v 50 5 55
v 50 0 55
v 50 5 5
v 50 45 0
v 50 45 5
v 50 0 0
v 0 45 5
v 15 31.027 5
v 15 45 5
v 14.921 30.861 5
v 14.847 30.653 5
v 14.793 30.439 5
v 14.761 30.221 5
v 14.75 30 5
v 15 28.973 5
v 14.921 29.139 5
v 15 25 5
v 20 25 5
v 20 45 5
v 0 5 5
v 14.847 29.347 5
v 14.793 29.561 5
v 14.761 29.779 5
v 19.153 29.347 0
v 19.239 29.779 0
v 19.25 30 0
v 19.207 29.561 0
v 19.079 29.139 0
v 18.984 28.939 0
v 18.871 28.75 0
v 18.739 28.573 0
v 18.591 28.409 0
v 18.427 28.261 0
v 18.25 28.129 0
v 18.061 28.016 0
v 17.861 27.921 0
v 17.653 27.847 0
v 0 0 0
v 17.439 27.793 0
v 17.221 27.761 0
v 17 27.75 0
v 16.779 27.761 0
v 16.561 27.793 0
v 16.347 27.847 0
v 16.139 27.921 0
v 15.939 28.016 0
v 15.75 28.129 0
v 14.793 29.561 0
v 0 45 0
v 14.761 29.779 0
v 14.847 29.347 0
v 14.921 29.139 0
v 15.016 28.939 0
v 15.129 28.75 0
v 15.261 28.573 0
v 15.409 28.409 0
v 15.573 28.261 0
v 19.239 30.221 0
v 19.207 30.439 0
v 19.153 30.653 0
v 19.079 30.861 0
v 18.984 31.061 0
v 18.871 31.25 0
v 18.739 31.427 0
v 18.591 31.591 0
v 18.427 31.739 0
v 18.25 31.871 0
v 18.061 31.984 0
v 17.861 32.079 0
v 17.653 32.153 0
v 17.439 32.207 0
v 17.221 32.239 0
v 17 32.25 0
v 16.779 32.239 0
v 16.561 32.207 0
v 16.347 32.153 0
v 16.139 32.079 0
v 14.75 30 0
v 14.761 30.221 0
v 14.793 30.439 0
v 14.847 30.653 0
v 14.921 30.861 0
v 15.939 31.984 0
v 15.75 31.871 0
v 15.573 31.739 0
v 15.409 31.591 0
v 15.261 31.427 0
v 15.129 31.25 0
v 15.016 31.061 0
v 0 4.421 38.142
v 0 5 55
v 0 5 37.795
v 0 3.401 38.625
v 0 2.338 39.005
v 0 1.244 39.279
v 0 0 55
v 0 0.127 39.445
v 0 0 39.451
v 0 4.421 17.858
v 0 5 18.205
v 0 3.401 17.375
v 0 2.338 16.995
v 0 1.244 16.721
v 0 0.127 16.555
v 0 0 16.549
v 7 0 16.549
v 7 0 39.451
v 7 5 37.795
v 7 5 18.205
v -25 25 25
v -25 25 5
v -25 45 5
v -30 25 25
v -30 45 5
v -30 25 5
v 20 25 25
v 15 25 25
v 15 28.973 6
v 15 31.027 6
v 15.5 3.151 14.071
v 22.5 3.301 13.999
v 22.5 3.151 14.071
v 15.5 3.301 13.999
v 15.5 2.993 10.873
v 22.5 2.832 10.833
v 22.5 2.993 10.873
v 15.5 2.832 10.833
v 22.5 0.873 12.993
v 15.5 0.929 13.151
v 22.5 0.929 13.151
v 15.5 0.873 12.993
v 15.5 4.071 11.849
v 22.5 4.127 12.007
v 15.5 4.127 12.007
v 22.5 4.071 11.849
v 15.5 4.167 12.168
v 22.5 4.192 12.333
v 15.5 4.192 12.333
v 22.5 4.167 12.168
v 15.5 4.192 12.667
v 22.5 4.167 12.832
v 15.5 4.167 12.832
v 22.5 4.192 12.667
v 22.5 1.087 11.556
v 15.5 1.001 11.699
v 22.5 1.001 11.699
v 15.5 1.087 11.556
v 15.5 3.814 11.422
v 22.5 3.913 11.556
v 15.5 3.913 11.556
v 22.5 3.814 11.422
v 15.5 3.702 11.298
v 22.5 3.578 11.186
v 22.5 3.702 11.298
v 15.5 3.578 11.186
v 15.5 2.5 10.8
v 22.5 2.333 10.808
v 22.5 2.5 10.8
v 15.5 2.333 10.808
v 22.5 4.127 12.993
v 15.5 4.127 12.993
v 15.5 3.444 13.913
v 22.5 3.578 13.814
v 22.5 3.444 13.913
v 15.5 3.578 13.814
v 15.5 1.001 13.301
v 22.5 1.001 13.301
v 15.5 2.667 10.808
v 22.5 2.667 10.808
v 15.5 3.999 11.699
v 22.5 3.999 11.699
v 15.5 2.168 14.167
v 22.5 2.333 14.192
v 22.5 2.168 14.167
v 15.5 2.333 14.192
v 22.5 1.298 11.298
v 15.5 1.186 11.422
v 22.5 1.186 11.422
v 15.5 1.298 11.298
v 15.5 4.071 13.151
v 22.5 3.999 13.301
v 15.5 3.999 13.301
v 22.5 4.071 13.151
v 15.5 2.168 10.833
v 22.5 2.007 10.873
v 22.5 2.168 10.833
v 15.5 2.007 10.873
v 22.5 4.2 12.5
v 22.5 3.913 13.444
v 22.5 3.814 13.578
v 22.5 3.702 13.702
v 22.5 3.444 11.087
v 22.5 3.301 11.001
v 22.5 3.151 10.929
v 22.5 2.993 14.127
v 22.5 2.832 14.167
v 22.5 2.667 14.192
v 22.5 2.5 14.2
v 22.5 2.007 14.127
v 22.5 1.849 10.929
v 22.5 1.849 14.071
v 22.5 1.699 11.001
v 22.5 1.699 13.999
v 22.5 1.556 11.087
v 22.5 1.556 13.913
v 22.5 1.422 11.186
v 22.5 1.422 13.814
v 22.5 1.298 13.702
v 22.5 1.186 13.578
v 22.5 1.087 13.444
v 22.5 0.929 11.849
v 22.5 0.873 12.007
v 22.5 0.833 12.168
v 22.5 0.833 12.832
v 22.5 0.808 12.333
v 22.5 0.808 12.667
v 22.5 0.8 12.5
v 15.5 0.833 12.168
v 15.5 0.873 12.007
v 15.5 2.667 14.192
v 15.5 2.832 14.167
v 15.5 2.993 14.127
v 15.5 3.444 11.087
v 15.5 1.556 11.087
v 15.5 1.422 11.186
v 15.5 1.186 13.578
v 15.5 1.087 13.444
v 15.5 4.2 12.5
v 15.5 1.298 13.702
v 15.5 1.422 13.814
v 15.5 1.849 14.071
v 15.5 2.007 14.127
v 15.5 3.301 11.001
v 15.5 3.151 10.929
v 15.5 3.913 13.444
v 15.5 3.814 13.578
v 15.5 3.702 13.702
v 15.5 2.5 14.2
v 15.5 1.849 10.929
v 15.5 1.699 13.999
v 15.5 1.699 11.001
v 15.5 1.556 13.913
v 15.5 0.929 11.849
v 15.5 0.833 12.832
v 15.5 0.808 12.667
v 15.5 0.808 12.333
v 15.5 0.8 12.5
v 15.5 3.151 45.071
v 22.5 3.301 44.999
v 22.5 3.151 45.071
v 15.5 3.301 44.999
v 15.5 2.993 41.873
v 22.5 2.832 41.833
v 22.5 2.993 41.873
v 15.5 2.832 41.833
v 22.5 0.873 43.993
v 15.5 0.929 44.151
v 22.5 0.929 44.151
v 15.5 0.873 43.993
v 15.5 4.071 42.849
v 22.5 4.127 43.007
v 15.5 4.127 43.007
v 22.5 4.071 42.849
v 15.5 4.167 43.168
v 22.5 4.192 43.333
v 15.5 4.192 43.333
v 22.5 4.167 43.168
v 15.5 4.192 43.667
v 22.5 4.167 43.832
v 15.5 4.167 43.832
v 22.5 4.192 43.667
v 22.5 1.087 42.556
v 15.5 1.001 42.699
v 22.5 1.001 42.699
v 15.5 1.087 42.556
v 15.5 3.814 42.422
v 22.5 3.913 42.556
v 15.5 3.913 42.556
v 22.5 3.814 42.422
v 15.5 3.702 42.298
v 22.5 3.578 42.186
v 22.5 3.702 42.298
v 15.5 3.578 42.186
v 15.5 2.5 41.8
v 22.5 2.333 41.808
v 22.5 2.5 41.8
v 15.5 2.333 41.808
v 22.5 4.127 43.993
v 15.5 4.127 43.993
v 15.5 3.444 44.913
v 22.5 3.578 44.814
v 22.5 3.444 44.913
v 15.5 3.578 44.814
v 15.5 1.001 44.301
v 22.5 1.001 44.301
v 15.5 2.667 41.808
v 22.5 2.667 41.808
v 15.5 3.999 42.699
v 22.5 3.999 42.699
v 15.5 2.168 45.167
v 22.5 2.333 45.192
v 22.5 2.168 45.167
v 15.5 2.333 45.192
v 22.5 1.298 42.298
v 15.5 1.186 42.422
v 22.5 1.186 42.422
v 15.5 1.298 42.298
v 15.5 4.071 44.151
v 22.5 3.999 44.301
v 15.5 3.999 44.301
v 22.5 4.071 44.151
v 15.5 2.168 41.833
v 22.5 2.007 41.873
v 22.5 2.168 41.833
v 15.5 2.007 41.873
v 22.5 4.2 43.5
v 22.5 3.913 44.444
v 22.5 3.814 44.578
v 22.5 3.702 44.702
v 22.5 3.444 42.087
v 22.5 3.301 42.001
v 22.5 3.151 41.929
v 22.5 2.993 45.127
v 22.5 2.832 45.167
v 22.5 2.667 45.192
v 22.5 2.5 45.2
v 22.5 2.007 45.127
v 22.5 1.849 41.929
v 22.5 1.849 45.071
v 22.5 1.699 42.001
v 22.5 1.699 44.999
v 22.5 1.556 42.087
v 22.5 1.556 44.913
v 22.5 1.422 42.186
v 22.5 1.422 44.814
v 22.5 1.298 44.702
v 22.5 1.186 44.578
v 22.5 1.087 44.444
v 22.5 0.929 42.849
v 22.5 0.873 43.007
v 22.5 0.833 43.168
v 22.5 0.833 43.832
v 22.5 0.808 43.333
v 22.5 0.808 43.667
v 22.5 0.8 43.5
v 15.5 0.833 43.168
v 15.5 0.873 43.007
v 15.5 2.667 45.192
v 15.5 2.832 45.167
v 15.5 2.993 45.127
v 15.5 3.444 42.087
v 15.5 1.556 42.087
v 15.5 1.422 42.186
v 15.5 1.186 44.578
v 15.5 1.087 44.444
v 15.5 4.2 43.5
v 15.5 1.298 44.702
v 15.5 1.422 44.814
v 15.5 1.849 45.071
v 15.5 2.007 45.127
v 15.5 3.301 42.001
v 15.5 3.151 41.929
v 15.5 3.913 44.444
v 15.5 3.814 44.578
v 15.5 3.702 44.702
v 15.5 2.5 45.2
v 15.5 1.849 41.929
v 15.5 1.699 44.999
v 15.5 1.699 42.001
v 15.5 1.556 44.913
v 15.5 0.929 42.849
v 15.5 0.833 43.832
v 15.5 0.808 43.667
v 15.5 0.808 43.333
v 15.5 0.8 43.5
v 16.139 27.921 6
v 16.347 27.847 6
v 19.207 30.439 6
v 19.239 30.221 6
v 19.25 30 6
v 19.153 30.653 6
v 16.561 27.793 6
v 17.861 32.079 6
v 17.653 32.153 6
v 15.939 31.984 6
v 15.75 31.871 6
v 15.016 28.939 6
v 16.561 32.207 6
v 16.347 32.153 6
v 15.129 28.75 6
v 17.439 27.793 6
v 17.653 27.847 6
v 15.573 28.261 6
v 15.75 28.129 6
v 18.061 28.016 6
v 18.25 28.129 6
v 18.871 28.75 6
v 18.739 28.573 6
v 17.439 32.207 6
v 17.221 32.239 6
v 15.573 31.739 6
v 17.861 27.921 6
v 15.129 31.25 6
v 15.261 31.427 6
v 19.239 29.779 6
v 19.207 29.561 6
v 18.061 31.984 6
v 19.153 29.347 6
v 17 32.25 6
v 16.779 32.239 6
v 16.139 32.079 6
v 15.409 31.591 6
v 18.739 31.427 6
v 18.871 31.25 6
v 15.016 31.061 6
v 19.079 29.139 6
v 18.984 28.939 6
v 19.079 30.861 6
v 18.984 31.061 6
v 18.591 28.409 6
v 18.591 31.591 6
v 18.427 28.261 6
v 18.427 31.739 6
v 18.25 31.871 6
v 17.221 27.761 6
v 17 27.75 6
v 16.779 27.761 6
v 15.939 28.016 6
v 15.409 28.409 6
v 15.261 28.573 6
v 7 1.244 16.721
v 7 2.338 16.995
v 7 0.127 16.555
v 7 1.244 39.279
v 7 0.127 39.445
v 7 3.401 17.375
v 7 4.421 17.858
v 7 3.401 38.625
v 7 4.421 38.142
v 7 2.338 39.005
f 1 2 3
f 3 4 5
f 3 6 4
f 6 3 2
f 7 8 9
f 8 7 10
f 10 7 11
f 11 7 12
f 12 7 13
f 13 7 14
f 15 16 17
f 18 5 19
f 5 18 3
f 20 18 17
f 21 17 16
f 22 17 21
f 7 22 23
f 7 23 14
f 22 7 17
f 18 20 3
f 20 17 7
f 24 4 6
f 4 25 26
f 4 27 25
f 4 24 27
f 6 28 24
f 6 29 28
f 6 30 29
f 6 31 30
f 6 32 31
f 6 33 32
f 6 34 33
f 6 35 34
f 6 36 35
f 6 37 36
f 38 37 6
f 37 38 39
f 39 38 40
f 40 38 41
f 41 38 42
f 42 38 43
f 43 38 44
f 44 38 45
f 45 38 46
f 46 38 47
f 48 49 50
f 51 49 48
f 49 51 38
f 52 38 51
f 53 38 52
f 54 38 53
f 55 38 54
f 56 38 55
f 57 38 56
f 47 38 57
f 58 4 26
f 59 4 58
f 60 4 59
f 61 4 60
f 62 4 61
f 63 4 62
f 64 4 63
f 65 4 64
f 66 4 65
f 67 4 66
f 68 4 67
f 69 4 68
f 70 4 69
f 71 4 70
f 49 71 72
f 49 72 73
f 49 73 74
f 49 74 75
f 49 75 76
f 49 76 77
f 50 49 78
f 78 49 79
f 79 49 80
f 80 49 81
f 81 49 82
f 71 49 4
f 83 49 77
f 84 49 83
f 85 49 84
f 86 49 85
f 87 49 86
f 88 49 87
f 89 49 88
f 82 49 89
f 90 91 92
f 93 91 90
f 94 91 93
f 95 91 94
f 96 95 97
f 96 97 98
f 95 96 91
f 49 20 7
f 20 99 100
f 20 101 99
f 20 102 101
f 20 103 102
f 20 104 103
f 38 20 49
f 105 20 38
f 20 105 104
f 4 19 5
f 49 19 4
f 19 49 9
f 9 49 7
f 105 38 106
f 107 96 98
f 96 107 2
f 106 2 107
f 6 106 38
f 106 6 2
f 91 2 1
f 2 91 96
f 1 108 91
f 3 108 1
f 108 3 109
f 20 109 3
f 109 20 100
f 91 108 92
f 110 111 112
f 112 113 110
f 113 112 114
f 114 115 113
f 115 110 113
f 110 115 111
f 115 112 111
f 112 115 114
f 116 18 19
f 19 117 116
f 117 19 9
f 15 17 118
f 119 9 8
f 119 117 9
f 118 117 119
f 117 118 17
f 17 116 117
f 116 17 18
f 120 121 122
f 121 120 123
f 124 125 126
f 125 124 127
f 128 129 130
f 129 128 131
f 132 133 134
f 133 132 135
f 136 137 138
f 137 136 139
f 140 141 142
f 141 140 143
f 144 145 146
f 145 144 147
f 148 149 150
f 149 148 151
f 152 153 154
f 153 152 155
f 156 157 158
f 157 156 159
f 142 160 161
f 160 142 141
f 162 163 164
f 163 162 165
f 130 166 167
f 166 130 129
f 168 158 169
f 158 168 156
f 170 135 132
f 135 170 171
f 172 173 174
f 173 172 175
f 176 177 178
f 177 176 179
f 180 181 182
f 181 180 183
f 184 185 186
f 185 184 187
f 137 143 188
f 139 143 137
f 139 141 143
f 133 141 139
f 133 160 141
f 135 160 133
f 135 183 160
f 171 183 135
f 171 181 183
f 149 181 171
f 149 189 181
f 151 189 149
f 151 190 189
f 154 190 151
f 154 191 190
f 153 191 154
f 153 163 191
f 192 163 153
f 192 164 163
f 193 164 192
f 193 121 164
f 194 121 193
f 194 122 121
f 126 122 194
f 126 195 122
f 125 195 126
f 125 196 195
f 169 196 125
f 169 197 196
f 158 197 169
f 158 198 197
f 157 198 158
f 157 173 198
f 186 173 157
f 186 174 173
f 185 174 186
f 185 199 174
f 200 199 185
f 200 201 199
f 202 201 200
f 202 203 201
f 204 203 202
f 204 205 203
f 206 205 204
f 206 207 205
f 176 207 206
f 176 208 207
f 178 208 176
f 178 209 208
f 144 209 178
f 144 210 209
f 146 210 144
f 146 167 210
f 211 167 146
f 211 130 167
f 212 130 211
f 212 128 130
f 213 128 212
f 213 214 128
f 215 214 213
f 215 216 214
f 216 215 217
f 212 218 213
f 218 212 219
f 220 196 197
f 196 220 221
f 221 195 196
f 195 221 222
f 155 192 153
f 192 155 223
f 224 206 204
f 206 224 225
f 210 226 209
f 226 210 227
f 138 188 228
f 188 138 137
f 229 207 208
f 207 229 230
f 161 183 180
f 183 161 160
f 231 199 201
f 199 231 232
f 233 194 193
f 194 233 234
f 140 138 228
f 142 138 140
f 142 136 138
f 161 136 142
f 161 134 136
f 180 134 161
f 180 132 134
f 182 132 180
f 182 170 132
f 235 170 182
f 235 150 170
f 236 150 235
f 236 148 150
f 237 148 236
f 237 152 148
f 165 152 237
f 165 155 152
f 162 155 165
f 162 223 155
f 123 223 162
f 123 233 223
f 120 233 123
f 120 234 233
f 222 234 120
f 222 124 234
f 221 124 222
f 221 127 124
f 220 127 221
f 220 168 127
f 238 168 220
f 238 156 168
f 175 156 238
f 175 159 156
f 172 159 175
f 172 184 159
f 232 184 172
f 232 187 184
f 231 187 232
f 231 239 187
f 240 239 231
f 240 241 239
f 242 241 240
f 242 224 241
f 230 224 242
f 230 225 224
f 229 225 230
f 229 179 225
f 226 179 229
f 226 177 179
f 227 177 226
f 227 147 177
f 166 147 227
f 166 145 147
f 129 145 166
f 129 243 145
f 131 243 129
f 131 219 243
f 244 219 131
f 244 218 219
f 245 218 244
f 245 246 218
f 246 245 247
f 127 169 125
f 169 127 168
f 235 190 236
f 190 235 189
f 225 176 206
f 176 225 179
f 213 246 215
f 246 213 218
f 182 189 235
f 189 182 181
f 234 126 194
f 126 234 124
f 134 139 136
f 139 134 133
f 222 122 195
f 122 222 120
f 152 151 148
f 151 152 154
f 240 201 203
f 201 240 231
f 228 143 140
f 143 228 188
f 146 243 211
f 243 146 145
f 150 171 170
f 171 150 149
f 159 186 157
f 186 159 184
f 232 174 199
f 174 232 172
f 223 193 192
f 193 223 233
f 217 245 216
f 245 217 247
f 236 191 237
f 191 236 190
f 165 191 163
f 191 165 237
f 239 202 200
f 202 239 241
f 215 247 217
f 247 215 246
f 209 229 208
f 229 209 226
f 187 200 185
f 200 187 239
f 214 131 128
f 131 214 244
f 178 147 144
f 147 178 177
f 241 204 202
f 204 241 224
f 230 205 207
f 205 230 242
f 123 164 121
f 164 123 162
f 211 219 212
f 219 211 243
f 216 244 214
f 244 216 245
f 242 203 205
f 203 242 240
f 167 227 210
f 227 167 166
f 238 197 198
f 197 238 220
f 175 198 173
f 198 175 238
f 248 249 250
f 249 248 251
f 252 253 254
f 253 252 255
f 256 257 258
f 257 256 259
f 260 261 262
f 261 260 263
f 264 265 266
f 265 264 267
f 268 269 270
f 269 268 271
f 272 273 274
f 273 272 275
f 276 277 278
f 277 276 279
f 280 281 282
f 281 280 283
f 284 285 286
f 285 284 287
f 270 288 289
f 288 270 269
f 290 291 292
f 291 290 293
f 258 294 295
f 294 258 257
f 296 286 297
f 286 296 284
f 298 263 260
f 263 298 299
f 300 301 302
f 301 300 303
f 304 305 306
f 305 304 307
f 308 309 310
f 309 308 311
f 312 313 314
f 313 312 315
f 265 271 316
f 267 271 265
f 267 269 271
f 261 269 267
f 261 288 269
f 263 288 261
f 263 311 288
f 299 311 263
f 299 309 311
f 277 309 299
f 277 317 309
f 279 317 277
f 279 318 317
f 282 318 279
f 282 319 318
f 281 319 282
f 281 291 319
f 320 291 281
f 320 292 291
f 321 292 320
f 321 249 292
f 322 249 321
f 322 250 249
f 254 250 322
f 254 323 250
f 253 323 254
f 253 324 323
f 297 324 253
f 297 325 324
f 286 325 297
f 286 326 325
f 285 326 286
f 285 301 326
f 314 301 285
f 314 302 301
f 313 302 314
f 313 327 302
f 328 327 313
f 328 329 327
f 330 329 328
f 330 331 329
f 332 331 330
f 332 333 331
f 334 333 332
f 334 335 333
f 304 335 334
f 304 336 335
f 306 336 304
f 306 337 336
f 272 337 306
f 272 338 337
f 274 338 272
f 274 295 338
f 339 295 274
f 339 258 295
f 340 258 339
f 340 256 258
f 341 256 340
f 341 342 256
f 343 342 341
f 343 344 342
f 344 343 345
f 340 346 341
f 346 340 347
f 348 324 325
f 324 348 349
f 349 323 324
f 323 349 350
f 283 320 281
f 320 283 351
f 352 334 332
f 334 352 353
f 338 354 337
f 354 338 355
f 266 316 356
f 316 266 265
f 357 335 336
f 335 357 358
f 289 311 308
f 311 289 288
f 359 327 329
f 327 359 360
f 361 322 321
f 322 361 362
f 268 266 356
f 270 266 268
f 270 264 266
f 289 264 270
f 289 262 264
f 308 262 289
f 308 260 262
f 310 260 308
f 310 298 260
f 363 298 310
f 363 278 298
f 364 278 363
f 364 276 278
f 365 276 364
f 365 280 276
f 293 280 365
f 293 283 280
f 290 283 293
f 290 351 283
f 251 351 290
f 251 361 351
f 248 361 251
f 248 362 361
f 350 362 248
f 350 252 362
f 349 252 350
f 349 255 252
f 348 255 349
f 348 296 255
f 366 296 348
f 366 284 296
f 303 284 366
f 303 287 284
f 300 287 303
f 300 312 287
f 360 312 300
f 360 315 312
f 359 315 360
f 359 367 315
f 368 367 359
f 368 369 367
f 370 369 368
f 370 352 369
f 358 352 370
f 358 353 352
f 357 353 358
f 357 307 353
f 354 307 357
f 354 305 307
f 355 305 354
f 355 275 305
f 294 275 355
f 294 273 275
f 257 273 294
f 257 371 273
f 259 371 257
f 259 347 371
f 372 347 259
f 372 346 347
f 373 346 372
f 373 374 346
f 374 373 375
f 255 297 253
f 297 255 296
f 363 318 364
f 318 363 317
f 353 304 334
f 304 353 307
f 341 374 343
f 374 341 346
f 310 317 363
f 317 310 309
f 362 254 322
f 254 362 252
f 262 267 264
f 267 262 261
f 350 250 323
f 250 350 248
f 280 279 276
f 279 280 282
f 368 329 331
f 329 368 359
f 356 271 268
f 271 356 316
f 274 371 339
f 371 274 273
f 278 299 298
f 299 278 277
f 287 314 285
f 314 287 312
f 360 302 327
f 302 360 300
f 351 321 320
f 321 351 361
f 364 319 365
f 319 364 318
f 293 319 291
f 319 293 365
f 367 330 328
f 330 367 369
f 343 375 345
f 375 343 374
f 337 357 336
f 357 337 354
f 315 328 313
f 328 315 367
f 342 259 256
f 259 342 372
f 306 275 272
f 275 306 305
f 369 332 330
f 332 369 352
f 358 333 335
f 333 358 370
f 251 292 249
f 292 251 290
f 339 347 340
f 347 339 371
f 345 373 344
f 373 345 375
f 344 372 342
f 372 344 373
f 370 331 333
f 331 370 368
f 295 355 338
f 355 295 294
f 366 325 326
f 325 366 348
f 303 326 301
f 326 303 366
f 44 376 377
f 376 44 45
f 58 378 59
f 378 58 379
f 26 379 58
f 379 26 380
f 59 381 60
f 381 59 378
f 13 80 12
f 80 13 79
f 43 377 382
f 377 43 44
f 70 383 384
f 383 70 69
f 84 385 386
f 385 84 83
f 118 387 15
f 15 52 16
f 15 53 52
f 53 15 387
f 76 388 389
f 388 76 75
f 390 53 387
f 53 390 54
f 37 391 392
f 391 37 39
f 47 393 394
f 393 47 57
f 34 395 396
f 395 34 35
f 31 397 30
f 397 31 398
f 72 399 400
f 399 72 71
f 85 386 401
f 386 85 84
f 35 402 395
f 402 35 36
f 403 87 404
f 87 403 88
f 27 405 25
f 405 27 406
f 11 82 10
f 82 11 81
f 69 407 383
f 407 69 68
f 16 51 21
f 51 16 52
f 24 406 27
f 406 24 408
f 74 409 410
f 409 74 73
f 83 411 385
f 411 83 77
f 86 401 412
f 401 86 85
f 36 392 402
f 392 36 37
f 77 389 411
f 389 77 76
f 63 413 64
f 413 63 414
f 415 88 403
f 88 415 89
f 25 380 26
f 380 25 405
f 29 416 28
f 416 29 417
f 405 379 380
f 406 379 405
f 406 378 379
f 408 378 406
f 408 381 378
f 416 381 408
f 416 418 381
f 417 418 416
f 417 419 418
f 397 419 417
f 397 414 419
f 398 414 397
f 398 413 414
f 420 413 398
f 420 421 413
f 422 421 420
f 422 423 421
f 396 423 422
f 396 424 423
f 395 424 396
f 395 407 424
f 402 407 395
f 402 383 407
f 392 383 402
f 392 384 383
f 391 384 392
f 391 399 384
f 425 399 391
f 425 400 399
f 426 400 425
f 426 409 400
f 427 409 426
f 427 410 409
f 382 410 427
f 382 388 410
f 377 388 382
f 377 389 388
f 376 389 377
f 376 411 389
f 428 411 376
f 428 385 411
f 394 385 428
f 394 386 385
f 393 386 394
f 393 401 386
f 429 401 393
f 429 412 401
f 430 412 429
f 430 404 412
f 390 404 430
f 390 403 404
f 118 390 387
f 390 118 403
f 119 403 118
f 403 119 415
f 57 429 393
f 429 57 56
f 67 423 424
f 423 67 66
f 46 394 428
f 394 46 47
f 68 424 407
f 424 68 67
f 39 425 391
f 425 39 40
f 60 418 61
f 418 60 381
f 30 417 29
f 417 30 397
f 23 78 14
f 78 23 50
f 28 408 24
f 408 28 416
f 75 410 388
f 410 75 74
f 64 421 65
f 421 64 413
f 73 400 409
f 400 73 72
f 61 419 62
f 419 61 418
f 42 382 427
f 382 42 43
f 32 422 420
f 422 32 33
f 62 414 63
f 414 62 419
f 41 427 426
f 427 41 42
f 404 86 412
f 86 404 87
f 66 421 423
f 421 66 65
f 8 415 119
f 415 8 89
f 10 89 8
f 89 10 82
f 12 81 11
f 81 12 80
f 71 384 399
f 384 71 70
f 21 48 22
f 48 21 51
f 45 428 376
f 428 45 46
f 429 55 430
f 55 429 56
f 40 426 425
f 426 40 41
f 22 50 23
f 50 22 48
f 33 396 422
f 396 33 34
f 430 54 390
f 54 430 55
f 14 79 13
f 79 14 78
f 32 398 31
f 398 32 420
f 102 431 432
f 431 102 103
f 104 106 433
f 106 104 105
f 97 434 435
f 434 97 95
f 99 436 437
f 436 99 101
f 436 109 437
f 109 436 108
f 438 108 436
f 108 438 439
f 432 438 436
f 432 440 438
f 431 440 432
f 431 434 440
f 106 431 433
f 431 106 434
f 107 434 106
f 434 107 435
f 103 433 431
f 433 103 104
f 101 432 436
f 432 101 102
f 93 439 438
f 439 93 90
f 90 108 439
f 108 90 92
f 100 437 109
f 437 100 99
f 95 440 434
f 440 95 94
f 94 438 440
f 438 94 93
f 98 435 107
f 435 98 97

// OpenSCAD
// L-shaped NEMA 17 Stepper Motor Mounting Bracket
// Designed for a syringe pump application.

// --- Dimensions ---
// Base Plate
base_x_min    = -25;
base_x_max    = 25;
base_y_min    = 0;
base_y_max    = 45;
base_z_min    = 0;
base_z_max    = 5;

// Base Plate Holes (M4)
m4_hole_d     = 4.5;
m4_hole_x1    = -17;
m4_hole_y1    = 30;
m4_hole_x2    = 17;
m4_hole_y2    = 30;

// Vertical Motor Plate
vert_x_min    = -25;
vert_x_max    = 25;
vert_y_min    = 0;
vert_y_max    = 5;
vert_z_min    = 5; // Sits on top of base plate
vert_z_max    = 55; // Total height 50 + base 5

// Motor Boss Hole (Centering)
boss_d        = 23;
boss_x        = 0;
boss_z        = 28;
boss_y_len    = 50; // Length of cut through the plate

// M3 Screw Holes (Pattern)
m3_hole_d     = 3.4;
m3_pattern_s  = 31; // Square pattern spacing

// Gussets
gusset_thick   = 5;
gusset_leg_y   = 20;
gusset_leg_z   = 20;

$fn = 64;

// --- Helper Modules ---

module gusset() {
    // Right triangle in YZ plane, extruded along X
    // Corner at y=5, z=5 (relative to global origin)
    // Note: The user specified the corner at y=5, z=5. 
    // Since the base is 5mm thick, the vertical plate starts at z=5.
    // The gusset is flush with the edges.
    rotate([0, -90, 0])
    linear_extrude(height = gusset_thick)
    polygon(points=[[0, 0], [gusset_leg_y, 0], [0, gusset_leg_z]]);
}

// --- Main Assembly ---

difference() {
    // --- Positive Geometry ---
    union() {
        // Base Plate
        translate([0, 0, 0])
        cube([base_x_max - base_x_min, base_y_max - base_y_min, base_z_max]);

        // Vertical Motor Plate
        translate([0, 0, base_z_max])
        cube([vert_x_max - vert_x_min, vert_y_max - vert_y_min, vert_z_max - base_z_max]);

        // Gusset Left
        translate([base_x_min, base_y_max - gusset_leg_y, base_z_max])
        rotate([0, 0, 0]) // Orientation handled in module
        gusset();

        // Gusset Right
        translate([vert_x_max - gusset_thick, base_y_max - gusset_leg_y, base_z_max])
        gusset();
    }

    // --- Negative Geometry (Cuts) ---

    // M4 Holes in Base Plate
    translate([m4_hole_x1, m4_hole_y1, -1]) 
        cylinder(h = base_z_max + 2, d = m4_hole_d);
    translate([m4_hole_x2, m4_hole_y2, -1]) 
        cylinder(h = base_z_max + 2, d = m4_hole_d);

    // Motor Boss Hole (through the vertical plate along Y)
    // The plate is at Y = 0 to 5. The hole is 23mm diameter.
    // The user says "cut a 23mm hole... along Y". 
    // Since the plate is only 5mm wide in Y, we cut through the thickness.
    translate([boss_x, -1, boss_z])
        rotate([0, 90, 0])
        cylinder(h = vert_y_max + 2, d = boss_d);

    // M3 Screw Holes (4 holes in a 31mm square pattern)
    // Centered on the boss hole (0, 28)
    for (sx = [-1, 1], sz = [-1, 1]) {
        translate([sx * (m3_pattern_s / 2), 2.5, boss_z + sz * (m3_pattern_s / 2)])
            rotate([0, 90, 0])
            cylinder(h = vert_y_max + 2, d = m3_hole_d);
    }
}
